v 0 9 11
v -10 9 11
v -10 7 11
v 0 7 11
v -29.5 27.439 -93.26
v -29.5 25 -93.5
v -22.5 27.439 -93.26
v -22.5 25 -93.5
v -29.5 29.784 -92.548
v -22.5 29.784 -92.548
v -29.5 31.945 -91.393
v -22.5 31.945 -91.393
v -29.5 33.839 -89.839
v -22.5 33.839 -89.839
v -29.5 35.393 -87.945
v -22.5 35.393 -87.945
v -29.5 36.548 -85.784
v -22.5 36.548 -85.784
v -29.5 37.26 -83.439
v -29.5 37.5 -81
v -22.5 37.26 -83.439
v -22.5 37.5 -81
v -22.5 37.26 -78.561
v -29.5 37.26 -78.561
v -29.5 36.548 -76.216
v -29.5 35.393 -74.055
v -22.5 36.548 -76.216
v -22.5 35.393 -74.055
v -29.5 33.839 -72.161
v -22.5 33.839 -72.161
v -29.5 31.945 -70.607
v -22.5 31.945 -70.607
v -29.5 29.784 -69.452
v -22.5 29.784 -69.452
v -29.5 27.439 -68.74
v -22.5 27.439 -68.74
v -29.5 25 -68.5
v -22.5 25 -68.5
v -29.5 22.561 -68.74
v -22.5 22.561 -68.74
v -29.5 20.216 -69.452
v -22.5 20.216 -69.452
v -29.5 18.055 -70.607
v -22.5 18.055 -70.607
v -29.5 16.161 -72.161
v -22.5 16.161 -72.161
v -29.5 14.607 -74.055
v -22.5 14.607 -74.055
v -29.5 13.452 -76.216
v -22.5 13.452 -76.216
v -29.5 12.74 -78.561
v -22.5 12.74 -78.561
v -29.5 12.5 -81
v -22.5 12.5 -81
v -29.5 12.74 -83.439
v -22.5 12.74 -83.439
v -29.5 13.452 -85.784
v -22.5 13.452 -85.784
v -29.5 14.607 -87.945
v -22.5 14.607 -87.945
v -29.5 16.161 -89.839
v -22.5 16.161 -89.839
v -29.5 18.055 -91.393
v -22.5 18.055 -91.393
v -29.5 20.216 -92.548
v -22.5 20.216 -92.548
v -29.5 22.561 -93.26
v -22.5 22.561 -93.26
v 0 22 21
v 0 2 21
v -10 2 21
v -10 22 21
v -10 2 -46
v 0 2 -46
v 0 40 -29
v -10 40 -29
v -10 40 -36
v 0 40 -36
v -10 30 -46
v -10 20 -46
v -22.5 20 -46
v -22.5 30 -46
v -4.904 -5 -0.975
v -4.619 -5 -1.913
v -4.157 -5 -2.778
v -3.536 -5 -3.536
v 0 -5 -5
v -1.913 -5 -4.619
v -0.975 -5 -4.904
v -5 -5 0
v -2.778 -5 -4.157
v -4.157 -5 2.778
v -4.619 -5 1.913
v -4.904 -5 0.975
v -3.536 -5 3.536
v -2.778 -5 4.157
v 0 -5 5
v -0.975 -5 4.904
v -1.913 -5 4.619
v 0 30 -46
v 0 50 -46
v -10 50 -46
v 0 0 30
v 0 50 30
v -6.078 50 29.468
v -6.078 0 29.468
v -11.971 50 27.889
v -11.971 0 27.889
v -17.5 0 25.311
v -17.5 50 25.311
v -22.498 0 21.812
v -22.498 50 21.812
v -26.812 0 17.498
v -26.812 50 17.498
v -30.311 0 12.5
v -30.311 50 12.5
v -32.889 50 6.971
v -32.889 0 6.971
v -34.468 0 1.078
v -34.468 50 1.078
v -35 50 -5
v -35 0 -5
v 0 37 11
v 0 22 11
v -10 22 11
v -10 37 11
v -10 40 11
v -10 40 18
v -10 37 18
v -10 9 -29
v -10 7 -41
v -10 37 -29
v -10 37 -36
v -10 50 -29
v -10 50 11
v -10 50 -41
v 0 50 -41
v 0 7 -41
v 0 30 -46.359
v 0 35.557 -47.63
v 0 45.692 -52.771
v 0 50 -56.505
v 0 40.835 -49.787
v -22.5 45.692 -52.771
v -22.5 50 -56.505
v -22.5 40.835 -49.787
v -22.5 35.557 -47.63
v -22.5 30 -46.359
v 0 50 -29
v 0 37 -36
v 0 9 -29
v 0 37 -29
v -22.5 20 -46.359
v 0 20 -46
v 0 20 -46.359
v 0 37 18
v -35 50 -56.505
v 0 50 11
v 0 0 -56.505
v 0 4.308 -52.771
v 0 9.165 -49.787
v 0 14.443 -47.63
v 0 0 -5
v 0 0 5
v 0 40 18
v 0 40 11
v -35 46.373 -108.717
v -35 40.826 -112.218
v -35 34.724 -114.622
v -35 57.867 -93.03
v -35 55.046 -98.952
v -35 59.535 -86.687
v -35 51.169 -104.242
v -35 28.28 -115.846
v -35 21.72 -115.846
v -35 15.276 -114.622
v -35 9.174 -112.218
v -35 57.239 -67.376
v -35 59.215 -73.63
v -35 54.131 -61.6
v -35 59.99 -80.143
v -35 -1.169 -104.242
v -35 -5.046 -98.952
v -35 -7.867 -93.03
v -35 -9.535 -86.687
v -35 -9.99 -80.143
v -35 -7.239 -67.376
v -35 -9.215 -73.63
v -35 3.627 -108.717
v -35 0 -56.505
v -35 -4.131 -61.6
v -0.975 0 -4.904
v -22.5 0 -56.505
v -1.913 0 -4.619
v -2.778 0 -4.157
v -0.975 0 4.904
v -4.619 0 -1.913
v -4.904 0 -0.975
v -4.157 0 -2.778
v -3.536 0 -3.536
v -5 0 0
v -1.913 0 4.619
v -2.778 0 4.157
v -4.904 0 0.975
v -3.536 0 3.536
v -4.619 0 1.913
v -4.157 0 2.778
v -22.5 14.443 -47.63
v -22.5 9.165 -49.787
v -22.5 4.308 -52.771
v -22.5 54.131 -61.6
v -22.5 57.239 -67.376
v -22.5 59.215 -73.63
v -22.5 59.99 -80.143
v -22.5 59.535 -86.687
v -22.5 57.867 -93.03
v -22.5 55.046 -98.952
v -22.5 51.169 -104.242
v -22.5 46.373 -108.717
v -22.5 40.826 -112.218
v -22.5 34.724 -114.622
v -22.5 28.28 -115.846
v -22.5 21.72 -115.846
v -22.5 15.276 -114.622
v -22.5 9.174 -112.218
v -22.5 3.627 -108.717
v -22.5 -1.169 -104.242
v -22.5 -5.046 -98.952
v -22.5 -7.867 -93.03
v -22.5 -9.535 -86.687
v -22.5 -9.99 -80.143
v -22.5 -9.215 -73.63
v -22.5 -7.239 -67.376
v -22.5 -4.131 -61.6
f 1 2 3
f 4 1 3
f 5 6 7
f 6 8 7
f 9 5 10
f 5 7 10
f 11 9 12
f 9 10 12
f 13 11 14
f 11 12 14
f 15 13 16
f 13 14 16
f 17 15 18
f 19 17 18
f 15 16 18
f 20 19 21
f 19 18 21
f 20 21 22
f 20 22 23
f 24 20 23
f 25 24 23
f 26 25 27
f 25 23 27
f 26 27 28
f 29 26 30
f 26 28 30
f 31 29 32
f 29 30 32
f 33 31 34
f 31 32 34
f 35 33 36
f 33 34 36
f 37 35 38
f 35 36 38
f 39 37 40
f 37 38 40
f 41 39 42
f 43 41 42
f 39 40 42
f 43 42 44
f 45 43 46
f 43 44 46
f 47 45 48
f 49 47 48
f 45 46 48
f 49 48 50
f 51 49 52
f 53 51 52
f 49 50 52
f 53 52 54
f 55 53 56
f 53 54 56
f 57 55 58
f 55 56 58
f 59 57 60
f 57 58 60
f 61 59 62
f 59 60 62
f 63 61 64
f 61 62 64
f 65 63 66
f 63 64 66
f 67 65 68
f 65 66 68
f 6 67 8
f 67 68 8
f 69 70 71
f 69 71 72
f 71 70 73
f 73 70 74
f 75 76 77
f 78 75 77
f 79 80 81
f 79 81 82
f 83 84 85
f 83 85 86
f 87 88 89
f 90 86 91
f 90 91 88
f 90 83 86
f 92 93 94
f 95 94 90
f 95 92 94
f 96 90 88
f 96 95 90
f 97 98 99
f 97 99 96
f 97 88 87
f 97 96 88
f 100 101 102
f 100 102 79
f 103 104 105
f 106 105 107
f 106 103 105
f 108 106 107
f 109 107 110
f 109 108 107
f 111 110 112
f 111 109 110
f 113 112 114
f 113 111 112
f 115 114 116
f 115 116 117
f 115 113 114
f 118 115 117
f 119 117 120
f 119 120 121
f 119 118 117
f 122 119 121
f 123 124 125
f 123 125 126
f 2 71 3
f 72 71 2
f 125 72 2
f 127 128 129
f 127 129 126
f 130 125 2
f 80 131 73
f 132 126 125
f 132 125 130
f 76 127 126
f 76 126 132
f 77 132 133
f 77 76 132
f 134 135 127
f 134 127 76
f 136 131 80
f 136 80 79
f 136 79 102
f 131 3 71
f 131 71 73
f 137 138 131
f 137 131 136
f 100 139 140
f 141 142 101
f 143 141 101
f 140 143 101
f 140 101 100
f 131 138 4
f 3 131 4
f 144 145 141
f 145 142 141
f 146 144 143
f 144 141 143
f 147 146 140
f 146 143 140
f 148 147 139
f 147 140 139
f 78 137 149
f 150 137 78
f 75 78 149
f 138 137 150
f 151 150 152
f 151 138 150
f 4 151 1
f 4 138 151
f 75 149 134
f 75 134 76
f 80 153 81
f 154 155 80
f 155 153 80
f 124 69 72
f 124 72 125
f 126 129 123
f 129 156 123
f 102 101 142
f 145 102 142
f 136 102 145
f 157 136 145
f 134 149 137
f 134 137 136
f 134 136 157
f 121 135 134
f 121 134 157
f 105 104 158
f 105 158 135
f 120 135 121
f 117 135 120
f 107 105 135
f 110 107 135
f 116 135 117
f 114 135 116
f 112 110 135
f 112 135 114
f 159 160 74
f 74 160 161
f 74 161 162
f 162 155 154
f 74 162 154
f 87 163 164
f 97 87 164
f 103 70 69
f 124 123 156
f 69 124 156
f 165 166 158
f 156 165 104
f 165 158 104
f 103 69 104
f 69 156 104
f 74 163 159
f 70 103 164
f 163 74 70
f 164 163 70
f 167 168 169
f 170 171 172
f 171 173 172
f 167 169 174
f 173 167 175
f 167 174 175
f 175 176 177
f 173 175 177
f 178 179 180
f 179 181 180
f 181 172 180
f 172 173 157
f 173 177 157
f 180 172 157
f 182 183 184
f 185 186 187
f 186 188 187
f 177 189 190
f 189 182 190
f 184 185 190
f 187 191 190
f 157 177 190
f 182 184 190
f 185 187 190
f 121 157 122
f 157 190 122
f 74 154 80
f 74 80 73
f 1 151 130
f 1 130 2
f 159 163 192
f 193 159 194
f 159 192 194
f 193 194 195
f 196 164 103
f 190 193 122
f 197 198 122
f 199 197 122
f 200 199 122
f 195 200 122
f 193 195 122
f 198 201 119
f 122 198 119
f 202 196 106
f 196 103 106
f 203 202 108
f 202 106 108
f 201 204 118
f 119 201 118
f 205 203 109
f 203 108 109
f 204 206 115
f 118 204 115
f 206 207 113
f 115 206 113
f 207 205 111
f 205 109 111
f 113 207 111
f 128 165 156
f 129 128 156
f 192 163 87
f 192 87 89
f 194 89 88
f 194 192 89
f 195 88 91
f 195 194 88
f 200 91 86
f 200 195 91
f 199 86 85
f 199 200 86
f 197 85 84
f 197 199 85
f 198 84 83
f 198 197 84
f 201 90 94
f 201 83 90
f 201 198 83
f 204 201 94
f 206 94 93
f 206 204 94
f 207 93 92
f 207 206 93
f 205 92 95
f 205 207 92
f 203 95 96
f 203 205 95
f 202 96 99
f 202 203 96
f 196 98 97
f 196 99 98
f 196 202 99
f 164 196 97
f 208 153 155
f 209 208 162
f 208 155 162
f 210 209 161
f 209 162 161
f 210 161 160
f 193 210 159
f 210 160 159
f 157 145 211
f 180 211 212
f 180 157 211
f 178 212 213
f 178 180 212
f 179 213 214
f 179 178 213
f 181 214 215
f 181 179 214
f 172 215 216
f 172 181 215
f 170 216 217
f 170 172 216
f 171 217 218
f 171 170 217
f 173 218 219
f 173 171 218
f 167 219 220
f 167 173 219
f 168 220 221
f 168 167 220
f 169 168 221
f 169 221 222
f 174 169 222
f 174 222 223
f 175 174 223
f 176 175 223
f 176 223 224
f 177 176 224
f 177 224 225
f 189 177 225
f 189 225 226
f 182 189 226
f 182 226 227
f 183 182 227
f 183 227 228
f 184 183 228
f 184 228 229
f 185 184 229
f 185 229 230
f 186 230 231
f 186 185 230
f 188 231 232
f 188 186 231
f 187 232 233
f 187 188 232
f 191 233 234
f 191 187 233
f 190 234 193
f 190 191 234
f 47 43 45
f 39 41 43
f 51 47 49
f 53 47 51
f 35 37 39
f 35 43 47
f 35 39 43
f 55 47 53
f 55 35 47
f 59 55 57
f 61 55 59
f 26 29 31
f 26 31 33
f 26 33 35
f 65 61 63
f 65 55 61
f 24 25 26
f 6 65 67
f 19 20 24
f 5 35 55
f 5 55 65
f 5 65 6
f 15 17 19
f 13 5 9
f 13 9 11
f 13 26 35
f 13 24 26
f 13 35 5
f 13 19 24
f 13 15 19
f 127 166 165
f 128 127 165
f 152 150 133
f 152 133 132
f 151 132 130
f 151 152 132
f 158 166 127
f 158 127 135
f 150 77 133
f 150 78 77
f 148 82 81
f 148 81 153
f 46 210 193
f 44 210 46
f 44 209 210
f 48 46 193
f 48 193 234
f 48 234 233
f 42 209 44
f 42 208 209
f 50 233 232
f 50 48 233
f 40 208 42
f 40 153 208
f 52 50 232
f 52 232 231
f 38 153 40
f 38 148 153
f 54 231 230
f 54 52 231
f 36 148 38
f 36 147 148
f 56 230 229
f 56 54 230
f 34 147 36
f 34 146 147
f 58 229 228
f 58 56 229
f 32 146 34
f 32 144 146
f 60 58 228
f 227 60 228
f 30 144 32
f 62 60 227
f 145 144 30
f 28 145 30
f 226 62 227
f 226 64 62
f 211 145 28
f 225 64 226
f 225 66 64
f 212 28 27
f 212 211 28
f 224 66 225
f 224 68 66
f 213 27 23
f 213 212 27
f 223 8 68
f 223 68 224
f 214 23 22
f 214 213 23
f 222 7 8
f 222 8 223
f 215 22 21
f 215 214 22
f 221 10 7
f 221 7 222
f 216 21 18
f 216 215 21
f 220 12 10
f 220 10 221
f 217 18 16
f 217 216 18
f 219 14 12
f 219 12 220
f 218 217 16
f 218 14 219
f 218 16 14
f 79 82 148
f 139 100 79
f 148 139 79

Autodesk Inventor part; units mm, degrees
ref_plane "YZ Plane" through (0, 0, 0) normal (1, 0, 0) x (0, 1, 0)
ref_plane "XZ Plane" through (0, 0, 0) normal (0, 1, 0) x (-1, 0, 0)
ref_plane "XY Plane" through (0, 0, 0) normal (0, 0, 1) x (1, 0, 0)
sketch "Sketch1" plane through (0, 0, 0) normal (0, 1, 0) x (-1, 0, 0)
  arc A0 (35, -5) -> (0, 30) centre (0, -5) ccw
  line L0 (34.641, 0) -> (0, 0)
  line L1 (-35, -5) -> (-35, -100) construction
  line L2 (-35, -100) -> (0, -100) construction
  line L3 (35, -100) -> (35, -5)
  line L4 (0, -100) -> (0, 30)
  arc A1 (0, 30) -> (-35, -5) centre (0, -5) ccw construction
  line L5 (0, -5) -> (-35, -5) construction
  line L6 (0, -100) -> (35, -100)
  dimension "d0" = 70
  dimension "d1" = 130
  dimension "d32" = 30
  dimension "d33" = 35
  dimension "d34" = 5
extrude "Extrusion1" add sketch "Sketch1" along normal blind 50
sketch "Sketch2" plane through (0, 0, 30) normal (1, 0, 0) x (0, 0, -1)
  line L0 (19, 49) -> (27.5, 49)
  line L1 (59, 49) -> (59, 40)
  line L2 (59, 9) -> (19, 9)
  line L3 (19, 9) -> (19, 14)
  line L4 (19, 40) -> (12, 40)
  line L5 (12, 40) -> (12, 37)
  line L6 (12, 37) -> (19, 37)
  line L7 (19, 37) -> (19, 40) construction
  line L8 (19, 17) -> (14, 17)
  line L9 (14, 17) -> (14, 14)
  line L10 (14, 14) -> (19, 14)
  line L11 (19, 14) -> (19, 17) construction
  line L12 (59, 40) -> (66, 40)
  line L13 (66, 40) -> (66, 37)
  line L14 (66, 37) -> (59, 37)
  line L15 (59, 37) -> (59, 40) construction
  line L16 (27.5, 49) -> (32.5, 49) construction
  line L17 (32.5, 49) -> (32.5, 54)
  line L18 (32.5, 54) -> (27.5, 54)
  line L19 (27.5, 54) -> (27.5, 49)
  line L20 (0, 50) -> (130, 50) projected
  line L21 (19, 40) -> (19, 49)
  line L22 (19, 37) -> (19, 40) construction
  line L23 (19, 17) -> (19, 37)
  line L24 (19, 14) -> (19, 17) construction
  line L25 (59, 40) -> (59, 37) construction
  line L26 (59, 37) -> (59, 9)
  line L27 (27.5, 49) -> (32.5, 49) construction
  line L28 (32.5, 49) -> (59, 49)
  line L29 (9, 22) -> (19, 22)
  line L30 (19, 22) -> (19, 7)
  line L31 (19, 2) -> (9, 2)
  line L32 (9, 2) -> (9, 22)
  line L33 (19, 2) -> (76, 2)
  line L34 (19, 49) -> (19, 50)
  line L35 (59, 49) -> (59, 50)
  line L36 (71, 7) -> (71, 50)
  line L37 (71, 50) -> (76, 50)
  line L38 (76, 50) -> (76, 2)
  line L39 (71, 7) -> (19, 7)
  line L40 (0, 0) -> (0, 50) projected
  line L41 (30, 54) -> (30, 14.5)
  point P0 (66, 38.5)
  point P1 (19, 9)
  point P2 (32.5, 50)
  point P3 (27.5, 50)
  point P4 (19, 9)
  dimension "d5" = 3
  dimension "d6" = 3
  dimension "d7" = 5
  dimension "d8" = 40
  dimension "d9" = 5
  dimension "d10" = 5
  dimension "d11" = 36
  dimension "d12" = 40
  dimension "d13" = 7
  dimension "d14" = 5
  dimension "d15" = 7
  dimension "d16" = 9
  dimension "d18" = 1
  dimension "d20" = 10
  dimension "d21" = 5
  dimension "d22" = 20
  dimension "d26" = 5
  dimension "d27" = 5
  dimension "d28" = 57
  dimension "d29" = 48
  dimension "d30" = 5
  dimension "d36" = 30
extrude "Extrusion2" cut sketch "Sketch2" against normal blind 10 contours L34 L20 L19 L0 | L0 L19 L20 L17 L28 L1 L12 L13 L14 L26 L2 L3 L30 L23 L6 L5 L4 L21 | L20 L35 L28 L17 | L23 L8 L9 L10 L3 L30 L39 L36 L20 L38 L33 L31 L32 L29 | L30 L10 L9 L8
sketch "Sketch3" plane through (-35, 0, -100) normal (-1, 0, 0) x (0, 0, 1)
  circle A0 centre (19, 25) radius 35
  line L0 (130, 0) -> (130, 50) projected
  line L1 (54, 50) -> (54, 2) projected
  line L2 (19, 25) -> (130, 25)
  point P0 (100, 0)
  dimension "d37" = 70
extrude "Extrusion3" add sketch "Sketch3" against normal up to surface (35 mm away)
sketch "Sketch4" plane through (0, 0, 0) normal (0, -1, 0) x (1, 0, 0)
  arc A0 (0, 5) -> (0, -5) centre (0, 0) ccw
  line L0 (0, 5) -> (0, -5)
  line L1 (0, -46) -> (0, 21) projected
  dimension "d41" = 10
extrude "Extrusion4" add sketch "Sketch4" along normal blind 5
sketch "Sketch5" plane through (0, 0, 30) normal (1, 0, 0) x (0, 0, -1)
  arc A0 (86.5051, 0) -> (86.5051, 50) centre (111, 25) ccw projected
  circle A1 centre (111, 25) radius 35
  line L0 (76, 30) -> (111, 30)
  line L1 (111, 30) -> (111, 20)
  line L2 (111, 20) -> (76, 20)
  line L3 (76, 20) -> (76, 30)
  line L4 (76, 50) -> (76, 2) projected
  point P0 (30, 0)
  point P1 (86.5051, 0)
  point P2 (76, 25)
  point P3 (76.359, 20)
  point P4 (76.359, 30)
  dimension "d46" = 10
extrude "Extrusion5" cut sketch "Sketch5" against normal blind 22.5
sketch "Sketch6" plane through (-22.5, 0, 30) normal (1, 0, 0) x (0, 0, -1)
  arc A0 (86.5051, 0) -> (86.5051, 50) centre (111, 25) ccw projected
  circle A1 centre (111, 25) radius 12.5
  point P0 (30, 0)
  dimension "d47" = 25
extrude "Extrusion6" cut sketch "Sketch6" against normal blind 7
equation "\"d33\" = 0.5 * d0"
equation "\"d34\" = 0.5 * d0 - d32"
properties part number "wirst 2 right"
